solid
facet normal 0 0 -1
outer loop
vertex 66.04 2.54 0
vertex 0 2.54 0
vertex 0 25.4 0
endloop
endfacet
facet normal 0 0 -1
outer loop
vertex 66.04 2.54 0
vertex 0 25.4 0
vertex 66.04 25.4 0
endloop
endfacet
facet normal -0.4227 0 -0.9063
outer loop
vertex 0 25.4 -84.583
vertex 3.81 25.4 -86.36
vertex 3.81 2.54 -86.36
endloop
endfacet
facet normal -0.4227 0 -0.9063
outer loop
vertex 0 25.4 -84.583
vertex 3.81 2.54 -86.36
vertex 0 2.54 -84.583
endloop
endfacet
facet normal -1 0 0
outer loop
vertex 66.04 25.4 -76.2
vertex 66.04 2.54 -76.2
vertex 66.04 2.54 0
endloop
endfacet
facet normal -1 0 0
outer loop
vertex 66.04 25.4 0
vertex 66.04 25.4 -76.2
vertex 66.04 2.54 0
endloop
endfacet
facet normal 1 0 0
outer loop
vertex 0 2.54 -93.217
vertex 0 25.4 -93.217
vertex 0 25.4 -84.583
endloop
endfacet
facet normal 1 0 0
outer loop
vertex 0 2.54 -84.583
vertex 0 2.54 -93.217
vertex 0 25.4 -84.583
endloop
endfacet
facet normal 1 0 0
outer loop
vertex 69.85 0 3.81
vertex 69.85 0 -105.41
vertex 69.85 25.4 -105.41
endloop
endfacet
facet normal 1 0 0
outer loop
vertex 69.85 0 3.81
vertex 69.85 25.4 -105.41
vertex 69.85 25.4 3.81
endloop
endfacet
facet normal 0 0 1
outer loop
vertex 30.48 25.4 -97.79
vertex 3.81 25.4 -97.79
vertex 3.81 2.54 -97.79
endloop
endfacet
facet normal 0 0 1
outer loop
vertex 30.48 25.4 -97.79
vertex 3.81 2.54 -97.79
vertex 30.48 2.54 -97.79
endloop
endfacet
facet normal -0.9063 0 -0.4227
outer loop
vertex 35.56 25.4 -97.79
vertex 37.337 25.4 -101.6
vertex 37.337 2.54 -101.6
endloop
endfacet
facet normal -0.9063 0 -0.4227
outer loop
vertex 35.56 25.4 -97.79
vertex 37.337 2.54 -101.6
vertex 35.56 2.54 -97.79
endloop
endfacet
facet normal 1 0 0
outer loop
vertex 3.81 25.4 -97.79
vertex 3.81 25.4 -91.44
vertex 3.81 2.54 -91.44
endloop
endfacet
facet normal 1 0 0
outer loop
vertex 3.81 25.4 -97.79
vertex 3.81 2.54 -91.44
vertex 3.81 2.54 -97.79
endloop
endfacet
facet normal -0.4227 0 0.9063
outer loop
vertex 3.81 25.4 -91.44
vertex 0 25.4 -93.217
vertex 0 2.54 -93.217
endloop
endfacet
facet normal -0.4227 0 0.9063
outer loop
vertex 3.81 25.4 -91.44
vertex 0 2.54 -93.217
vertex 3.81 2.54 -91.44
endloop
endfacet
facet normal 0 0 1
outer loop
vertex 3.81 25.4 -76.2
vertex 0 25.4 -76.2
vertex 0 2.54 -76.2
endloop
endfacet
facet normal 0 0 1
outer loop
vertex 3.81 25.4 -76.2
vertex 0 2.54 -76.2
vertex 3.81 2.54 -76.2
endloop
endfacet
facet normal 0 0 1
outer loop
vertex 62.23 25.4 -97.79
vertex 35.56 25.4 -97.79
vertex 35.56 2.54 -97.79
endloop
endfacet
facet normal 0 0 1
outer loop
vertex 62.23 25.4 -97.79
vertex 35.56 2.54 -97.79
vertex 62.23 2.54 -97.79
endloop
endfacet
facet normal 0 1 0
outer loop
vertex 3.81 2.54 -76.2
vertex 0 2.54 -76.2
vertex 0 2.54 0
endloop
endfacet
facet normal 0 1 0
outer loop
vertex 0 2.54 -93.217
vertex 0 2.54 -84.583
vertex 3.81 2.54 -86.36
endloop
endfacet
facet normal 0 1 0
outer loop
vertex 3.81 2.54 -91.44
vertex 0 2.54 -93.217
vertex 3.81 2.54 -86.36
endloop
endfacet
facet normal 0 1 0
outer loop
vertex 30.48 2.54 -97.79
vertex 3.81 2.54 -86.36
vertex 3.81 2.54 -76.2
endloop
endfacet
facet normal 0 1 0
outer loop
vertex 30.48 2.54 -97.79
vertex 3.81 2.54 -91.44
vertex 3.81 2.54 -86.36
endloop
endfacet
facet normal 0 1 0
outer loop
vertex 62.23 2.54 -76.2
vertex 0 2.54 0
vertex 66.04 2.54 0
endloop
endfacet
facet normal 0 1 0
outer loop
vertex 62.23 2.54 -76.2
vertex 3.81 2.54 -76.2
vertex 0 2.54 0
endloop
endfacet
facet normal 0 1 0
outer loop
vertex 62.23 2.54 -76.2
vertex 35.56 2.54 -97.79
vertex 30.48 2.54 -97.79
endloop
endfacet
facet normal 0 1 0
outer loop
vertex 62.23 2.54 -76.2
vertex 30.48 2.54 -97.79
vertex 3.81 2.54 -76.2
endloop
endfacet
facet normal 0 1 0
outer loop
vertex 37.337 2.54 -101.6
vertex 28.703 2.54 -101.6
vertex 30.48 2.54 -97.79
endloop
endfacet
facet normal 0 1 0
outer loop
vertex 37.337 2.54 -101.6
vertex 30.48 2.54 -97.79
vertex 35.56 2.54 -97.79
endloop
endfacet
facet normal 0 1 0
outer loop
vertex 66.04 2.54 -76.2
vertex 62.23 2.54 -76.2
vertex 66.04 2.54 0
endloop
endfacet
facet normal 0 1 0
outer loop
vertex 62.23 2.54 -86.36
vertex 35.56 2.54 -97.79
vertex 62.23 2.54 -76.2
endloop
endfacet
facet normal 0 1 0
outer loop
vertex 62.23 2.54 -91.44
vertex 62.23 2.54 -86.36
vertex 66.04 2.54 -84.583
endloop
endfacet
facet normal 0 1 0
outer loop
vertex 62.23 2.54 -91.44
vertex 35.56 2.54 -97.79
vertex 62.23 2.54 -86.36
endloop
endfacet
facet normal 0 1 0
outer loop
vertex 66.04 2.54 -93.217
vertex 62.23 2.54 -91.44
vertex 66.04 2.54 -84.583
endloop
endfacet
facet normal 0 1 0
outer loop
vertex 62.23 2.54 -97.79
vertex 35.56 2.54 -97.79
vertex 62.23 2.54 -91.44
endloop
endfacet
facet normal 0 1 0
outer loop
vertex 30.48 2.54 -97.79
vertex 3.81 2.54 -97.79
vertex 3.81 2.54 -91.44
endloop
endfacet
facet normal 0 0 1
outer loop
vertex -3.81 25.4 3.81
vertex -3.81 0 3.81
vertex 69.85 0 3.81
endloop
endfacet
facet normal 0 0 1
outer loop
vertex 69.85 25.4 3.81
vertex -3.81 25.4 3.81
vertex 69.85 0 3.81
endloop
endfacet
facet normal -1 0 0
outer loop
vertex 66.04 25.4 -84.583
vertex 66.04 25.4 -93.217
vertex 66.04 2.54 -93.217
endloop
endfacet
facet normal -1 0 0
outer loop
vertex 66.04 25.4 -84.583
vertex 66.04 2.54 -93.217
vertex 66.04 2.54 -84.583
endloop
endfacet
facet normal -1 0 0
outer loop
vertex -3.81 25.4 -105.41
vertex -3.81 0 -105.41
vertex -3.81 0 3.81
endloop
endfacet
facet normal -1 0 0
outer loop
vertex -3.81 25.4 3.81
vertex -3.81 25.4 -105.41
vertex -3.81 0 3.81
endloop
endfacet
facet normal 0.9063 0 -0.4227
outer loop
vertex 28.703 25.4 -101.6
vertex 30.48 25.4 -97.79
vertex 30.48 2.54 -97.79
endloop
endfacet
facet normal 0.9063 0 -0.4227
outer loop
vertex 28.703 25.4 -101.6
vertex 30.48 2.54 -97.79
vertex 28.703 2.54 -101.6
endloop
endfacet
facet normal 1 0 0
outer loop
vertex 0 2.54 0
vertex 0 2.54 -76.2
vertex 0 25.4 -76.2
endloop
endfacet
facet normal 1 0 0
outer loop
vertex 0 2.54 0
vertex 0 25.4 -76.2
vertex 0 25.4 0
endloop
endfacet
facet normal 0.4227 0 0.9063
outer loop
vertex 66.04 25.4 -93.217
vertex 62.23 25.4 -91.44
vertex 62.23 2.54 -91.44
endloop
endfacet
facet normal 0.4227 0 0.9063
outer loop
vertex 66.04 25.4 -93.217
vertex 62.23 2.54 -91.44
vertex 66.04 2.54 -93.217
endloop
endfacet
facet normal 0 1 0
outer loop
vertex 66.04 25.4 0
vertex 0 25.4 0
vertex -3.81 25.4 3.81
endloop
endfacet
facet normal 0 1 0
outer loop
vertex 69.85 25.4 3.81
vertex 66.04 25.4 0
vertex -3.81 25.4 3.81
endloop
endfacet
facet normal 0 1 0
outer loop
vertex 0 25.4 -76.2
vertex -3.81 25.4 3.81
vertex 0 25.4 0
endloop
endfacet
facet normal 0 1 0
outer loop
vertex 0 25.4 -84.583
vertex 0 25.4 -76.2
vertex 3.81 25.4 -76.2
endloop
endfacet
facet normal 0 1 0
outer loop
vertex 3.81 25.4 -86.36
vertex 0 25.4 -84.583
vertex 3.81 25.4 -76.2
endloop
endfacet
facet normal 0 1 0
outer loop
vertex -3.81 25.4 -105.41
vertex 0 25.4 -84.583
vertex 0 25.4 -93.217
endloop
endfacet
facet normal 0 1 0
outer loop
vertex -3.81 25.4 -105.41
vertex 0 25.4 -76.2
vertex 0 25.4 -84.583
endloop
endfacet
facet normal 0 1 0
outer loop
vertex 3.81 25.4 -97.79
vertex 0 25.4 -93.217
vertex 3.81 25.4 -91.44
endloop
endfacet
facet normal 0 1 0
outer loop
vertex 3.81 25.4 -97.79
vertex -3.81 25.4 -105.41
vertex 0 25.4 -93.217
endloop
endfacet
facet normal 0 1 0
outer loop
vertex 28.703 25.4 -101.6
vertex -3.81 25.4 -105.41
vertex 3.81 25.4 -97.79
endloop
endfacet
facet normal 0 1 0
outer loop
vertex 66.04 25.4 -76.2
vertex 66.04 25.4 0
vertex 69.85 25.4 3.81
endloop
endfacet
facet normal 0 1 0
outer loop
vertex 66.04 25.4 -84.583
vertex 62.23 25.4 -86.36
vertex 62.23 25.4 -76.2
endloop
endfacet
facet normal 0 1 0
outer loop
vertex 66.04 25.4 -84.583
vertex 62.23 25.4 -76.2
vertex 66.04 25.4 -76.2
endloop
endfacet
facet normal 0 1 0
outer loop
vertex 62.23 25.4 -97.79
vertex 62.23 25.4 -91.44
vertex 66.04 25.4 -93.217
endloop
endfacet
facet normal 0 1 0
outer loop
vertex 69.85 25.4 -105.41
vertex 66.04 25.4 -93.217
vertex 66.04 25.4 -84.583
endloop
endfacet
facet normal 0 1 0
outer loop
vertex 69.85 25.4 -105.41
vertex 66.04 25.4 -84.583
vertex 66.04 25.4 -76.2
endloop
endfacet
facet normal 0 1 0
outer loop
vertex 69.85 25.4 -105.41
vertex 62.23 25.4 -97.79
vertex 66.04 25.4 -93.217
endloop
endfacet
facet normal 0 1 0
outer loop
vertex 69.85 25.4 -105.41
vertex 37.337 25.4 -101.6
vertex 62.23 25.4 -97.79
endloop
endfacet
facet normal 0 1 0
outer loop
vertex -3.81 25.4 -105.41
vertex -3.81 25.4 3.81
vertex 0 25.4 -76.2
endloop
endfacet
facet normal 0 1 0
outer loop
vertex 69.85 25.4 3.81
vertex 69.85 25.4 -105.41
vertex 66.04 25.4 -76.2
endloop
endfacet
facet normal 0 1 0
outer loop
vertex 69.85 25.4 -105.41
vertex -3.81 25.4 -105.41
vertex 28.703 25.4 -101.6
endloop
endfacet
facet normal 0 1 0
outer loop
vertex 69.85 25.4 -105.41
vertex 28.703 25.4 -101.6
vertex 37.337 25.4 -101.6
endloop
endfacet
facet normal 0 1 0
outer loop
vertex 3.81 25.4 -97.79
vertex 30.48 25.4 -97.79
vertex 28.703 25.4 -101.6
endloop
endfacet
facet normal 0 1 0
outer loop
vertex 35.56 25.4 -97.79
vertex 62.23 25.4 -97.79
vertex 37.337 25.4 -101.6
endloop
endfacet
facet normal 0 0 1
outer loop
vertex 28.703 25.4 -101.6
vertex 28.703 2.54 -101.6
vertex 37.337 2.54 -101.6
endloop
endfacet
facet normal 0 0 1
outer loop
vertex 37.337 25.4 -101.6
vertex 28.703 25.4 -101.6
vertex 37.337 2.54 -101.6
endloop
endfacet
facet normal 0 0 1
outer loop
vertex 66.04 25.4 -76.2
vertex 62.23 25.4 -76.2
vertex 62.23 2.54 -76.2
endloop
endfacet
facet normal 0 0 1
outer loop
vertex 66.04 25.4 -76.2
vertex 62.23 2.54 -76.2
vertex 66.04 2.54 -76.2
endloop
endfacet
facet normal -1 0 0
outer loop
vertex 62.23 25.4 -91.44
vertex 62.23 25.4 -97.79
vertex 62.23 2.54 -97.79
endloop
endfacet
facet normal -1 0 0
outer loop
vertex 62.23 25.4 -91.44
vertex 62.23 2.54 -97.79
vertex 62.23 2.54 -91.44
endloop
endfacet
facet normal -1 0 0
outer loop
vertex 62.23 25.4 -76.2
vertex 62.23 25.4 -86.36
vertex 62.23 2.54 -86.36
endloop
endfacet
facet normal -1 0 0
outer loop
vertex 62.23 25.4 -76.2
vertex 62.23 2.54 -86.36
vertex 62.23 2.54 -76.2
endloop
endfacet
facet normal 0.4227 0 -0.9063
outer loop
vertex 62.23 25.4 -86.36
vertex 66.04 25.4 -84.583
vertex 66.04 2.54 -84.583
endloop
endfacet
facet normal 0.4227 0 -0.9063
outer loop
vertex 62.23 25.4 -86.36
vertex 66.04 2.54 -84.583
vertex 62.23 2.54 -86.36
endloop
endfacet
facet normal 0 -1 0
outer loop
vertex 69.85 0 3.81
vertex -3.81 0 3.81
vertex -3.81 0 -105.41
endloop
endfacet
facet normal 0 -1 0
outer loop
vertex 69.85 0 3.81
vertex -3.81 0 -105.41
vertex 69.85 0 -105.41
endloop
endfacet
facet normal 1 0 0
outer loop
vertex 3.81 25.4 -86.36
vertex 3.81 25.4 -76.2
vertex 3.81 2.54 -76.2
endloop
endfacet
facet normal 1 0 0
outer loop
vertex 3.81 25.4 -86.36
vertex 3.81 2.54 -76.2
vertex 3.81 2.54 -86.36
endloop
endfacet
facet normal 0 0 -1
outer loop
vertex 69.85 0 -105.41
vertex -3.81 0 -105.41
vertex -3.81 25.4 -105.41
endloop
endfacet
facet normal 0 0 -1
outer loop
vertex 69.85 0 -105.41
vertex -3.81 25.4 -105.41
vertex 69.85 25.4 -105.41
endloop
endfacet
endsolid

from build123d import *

# Parameters (mm, degrees)
SKETCH1_W          = 66.04
SKETCH1_H          = 101.6
BASE_EXTRUDE_DEPTH = 2.54
SKETCH2_W          = 73.66
SKETCH2_H          = 109.22
SKETCH2_W_2        = 66.04
SKETCH2_H_2        = 101.6
WALLS_DEPTH        = 25.4
BUTTON_GUIDE_DEPTH = 22.86


with BuildPart() as part:
    # Sketch1 → Base Extrude (new body)
    with BuildSketch(Plane(origin=(0, 0, 0), x_dir=(1, 0, 0), z_dir=(0, 1, 0))):
        with Locations((33.02, 50.8)):
            Rectangle(SKETCH1_W, SKETCH1_H)
    extrude(amount=BASE_EXTRUDE_DEPTH)

    # Sketch2 → Walls (add)
    with BuildSketch(Plane.XZ):
        with Locations((33.02, -50.8)):
            Rectangle(SKETCH2_W, SKETCH2_H)
        with Locations((33.02, -50.8)):
            Rectangle(SKETCH2_W_2, SKETCH2_H_2, mode=Mode.SUBTRACT)
    extrude(amount=-WALLS_DEPTH)

    # Sketch3 → Button Guide (add)
    with BuildSketch(Plane(origin=(0, 25.4, 0), x_dir=(1, 0, 0), z_dir=(0, 1, 0))):
        Polygon((3.81, 86.36), (0, 84.583367822), (0, 76.2), (3.81, 76.2), align=None)
        Polygon((28.703367822, 101.6), (0, 101.6), (0, 93.216632178), (3.81, 91.44), (3.81, 97.79), (30.48, 97.79), align=None)
        Polygon((66.04, 101.6), (37.336632178, 101.6), (35.56, 97.79), (62.23, 97.79), (62.23, 91.44), (66.04, 93.216632178), align=None)
        Polygon((66.04, 76.2), (66.04, 84.583367822), (62.23, 86.36), (62.23, 76.2), align=None)
    extrude(amount=-BUTTON_GUIDE_DEPTH)


solid = part.part
